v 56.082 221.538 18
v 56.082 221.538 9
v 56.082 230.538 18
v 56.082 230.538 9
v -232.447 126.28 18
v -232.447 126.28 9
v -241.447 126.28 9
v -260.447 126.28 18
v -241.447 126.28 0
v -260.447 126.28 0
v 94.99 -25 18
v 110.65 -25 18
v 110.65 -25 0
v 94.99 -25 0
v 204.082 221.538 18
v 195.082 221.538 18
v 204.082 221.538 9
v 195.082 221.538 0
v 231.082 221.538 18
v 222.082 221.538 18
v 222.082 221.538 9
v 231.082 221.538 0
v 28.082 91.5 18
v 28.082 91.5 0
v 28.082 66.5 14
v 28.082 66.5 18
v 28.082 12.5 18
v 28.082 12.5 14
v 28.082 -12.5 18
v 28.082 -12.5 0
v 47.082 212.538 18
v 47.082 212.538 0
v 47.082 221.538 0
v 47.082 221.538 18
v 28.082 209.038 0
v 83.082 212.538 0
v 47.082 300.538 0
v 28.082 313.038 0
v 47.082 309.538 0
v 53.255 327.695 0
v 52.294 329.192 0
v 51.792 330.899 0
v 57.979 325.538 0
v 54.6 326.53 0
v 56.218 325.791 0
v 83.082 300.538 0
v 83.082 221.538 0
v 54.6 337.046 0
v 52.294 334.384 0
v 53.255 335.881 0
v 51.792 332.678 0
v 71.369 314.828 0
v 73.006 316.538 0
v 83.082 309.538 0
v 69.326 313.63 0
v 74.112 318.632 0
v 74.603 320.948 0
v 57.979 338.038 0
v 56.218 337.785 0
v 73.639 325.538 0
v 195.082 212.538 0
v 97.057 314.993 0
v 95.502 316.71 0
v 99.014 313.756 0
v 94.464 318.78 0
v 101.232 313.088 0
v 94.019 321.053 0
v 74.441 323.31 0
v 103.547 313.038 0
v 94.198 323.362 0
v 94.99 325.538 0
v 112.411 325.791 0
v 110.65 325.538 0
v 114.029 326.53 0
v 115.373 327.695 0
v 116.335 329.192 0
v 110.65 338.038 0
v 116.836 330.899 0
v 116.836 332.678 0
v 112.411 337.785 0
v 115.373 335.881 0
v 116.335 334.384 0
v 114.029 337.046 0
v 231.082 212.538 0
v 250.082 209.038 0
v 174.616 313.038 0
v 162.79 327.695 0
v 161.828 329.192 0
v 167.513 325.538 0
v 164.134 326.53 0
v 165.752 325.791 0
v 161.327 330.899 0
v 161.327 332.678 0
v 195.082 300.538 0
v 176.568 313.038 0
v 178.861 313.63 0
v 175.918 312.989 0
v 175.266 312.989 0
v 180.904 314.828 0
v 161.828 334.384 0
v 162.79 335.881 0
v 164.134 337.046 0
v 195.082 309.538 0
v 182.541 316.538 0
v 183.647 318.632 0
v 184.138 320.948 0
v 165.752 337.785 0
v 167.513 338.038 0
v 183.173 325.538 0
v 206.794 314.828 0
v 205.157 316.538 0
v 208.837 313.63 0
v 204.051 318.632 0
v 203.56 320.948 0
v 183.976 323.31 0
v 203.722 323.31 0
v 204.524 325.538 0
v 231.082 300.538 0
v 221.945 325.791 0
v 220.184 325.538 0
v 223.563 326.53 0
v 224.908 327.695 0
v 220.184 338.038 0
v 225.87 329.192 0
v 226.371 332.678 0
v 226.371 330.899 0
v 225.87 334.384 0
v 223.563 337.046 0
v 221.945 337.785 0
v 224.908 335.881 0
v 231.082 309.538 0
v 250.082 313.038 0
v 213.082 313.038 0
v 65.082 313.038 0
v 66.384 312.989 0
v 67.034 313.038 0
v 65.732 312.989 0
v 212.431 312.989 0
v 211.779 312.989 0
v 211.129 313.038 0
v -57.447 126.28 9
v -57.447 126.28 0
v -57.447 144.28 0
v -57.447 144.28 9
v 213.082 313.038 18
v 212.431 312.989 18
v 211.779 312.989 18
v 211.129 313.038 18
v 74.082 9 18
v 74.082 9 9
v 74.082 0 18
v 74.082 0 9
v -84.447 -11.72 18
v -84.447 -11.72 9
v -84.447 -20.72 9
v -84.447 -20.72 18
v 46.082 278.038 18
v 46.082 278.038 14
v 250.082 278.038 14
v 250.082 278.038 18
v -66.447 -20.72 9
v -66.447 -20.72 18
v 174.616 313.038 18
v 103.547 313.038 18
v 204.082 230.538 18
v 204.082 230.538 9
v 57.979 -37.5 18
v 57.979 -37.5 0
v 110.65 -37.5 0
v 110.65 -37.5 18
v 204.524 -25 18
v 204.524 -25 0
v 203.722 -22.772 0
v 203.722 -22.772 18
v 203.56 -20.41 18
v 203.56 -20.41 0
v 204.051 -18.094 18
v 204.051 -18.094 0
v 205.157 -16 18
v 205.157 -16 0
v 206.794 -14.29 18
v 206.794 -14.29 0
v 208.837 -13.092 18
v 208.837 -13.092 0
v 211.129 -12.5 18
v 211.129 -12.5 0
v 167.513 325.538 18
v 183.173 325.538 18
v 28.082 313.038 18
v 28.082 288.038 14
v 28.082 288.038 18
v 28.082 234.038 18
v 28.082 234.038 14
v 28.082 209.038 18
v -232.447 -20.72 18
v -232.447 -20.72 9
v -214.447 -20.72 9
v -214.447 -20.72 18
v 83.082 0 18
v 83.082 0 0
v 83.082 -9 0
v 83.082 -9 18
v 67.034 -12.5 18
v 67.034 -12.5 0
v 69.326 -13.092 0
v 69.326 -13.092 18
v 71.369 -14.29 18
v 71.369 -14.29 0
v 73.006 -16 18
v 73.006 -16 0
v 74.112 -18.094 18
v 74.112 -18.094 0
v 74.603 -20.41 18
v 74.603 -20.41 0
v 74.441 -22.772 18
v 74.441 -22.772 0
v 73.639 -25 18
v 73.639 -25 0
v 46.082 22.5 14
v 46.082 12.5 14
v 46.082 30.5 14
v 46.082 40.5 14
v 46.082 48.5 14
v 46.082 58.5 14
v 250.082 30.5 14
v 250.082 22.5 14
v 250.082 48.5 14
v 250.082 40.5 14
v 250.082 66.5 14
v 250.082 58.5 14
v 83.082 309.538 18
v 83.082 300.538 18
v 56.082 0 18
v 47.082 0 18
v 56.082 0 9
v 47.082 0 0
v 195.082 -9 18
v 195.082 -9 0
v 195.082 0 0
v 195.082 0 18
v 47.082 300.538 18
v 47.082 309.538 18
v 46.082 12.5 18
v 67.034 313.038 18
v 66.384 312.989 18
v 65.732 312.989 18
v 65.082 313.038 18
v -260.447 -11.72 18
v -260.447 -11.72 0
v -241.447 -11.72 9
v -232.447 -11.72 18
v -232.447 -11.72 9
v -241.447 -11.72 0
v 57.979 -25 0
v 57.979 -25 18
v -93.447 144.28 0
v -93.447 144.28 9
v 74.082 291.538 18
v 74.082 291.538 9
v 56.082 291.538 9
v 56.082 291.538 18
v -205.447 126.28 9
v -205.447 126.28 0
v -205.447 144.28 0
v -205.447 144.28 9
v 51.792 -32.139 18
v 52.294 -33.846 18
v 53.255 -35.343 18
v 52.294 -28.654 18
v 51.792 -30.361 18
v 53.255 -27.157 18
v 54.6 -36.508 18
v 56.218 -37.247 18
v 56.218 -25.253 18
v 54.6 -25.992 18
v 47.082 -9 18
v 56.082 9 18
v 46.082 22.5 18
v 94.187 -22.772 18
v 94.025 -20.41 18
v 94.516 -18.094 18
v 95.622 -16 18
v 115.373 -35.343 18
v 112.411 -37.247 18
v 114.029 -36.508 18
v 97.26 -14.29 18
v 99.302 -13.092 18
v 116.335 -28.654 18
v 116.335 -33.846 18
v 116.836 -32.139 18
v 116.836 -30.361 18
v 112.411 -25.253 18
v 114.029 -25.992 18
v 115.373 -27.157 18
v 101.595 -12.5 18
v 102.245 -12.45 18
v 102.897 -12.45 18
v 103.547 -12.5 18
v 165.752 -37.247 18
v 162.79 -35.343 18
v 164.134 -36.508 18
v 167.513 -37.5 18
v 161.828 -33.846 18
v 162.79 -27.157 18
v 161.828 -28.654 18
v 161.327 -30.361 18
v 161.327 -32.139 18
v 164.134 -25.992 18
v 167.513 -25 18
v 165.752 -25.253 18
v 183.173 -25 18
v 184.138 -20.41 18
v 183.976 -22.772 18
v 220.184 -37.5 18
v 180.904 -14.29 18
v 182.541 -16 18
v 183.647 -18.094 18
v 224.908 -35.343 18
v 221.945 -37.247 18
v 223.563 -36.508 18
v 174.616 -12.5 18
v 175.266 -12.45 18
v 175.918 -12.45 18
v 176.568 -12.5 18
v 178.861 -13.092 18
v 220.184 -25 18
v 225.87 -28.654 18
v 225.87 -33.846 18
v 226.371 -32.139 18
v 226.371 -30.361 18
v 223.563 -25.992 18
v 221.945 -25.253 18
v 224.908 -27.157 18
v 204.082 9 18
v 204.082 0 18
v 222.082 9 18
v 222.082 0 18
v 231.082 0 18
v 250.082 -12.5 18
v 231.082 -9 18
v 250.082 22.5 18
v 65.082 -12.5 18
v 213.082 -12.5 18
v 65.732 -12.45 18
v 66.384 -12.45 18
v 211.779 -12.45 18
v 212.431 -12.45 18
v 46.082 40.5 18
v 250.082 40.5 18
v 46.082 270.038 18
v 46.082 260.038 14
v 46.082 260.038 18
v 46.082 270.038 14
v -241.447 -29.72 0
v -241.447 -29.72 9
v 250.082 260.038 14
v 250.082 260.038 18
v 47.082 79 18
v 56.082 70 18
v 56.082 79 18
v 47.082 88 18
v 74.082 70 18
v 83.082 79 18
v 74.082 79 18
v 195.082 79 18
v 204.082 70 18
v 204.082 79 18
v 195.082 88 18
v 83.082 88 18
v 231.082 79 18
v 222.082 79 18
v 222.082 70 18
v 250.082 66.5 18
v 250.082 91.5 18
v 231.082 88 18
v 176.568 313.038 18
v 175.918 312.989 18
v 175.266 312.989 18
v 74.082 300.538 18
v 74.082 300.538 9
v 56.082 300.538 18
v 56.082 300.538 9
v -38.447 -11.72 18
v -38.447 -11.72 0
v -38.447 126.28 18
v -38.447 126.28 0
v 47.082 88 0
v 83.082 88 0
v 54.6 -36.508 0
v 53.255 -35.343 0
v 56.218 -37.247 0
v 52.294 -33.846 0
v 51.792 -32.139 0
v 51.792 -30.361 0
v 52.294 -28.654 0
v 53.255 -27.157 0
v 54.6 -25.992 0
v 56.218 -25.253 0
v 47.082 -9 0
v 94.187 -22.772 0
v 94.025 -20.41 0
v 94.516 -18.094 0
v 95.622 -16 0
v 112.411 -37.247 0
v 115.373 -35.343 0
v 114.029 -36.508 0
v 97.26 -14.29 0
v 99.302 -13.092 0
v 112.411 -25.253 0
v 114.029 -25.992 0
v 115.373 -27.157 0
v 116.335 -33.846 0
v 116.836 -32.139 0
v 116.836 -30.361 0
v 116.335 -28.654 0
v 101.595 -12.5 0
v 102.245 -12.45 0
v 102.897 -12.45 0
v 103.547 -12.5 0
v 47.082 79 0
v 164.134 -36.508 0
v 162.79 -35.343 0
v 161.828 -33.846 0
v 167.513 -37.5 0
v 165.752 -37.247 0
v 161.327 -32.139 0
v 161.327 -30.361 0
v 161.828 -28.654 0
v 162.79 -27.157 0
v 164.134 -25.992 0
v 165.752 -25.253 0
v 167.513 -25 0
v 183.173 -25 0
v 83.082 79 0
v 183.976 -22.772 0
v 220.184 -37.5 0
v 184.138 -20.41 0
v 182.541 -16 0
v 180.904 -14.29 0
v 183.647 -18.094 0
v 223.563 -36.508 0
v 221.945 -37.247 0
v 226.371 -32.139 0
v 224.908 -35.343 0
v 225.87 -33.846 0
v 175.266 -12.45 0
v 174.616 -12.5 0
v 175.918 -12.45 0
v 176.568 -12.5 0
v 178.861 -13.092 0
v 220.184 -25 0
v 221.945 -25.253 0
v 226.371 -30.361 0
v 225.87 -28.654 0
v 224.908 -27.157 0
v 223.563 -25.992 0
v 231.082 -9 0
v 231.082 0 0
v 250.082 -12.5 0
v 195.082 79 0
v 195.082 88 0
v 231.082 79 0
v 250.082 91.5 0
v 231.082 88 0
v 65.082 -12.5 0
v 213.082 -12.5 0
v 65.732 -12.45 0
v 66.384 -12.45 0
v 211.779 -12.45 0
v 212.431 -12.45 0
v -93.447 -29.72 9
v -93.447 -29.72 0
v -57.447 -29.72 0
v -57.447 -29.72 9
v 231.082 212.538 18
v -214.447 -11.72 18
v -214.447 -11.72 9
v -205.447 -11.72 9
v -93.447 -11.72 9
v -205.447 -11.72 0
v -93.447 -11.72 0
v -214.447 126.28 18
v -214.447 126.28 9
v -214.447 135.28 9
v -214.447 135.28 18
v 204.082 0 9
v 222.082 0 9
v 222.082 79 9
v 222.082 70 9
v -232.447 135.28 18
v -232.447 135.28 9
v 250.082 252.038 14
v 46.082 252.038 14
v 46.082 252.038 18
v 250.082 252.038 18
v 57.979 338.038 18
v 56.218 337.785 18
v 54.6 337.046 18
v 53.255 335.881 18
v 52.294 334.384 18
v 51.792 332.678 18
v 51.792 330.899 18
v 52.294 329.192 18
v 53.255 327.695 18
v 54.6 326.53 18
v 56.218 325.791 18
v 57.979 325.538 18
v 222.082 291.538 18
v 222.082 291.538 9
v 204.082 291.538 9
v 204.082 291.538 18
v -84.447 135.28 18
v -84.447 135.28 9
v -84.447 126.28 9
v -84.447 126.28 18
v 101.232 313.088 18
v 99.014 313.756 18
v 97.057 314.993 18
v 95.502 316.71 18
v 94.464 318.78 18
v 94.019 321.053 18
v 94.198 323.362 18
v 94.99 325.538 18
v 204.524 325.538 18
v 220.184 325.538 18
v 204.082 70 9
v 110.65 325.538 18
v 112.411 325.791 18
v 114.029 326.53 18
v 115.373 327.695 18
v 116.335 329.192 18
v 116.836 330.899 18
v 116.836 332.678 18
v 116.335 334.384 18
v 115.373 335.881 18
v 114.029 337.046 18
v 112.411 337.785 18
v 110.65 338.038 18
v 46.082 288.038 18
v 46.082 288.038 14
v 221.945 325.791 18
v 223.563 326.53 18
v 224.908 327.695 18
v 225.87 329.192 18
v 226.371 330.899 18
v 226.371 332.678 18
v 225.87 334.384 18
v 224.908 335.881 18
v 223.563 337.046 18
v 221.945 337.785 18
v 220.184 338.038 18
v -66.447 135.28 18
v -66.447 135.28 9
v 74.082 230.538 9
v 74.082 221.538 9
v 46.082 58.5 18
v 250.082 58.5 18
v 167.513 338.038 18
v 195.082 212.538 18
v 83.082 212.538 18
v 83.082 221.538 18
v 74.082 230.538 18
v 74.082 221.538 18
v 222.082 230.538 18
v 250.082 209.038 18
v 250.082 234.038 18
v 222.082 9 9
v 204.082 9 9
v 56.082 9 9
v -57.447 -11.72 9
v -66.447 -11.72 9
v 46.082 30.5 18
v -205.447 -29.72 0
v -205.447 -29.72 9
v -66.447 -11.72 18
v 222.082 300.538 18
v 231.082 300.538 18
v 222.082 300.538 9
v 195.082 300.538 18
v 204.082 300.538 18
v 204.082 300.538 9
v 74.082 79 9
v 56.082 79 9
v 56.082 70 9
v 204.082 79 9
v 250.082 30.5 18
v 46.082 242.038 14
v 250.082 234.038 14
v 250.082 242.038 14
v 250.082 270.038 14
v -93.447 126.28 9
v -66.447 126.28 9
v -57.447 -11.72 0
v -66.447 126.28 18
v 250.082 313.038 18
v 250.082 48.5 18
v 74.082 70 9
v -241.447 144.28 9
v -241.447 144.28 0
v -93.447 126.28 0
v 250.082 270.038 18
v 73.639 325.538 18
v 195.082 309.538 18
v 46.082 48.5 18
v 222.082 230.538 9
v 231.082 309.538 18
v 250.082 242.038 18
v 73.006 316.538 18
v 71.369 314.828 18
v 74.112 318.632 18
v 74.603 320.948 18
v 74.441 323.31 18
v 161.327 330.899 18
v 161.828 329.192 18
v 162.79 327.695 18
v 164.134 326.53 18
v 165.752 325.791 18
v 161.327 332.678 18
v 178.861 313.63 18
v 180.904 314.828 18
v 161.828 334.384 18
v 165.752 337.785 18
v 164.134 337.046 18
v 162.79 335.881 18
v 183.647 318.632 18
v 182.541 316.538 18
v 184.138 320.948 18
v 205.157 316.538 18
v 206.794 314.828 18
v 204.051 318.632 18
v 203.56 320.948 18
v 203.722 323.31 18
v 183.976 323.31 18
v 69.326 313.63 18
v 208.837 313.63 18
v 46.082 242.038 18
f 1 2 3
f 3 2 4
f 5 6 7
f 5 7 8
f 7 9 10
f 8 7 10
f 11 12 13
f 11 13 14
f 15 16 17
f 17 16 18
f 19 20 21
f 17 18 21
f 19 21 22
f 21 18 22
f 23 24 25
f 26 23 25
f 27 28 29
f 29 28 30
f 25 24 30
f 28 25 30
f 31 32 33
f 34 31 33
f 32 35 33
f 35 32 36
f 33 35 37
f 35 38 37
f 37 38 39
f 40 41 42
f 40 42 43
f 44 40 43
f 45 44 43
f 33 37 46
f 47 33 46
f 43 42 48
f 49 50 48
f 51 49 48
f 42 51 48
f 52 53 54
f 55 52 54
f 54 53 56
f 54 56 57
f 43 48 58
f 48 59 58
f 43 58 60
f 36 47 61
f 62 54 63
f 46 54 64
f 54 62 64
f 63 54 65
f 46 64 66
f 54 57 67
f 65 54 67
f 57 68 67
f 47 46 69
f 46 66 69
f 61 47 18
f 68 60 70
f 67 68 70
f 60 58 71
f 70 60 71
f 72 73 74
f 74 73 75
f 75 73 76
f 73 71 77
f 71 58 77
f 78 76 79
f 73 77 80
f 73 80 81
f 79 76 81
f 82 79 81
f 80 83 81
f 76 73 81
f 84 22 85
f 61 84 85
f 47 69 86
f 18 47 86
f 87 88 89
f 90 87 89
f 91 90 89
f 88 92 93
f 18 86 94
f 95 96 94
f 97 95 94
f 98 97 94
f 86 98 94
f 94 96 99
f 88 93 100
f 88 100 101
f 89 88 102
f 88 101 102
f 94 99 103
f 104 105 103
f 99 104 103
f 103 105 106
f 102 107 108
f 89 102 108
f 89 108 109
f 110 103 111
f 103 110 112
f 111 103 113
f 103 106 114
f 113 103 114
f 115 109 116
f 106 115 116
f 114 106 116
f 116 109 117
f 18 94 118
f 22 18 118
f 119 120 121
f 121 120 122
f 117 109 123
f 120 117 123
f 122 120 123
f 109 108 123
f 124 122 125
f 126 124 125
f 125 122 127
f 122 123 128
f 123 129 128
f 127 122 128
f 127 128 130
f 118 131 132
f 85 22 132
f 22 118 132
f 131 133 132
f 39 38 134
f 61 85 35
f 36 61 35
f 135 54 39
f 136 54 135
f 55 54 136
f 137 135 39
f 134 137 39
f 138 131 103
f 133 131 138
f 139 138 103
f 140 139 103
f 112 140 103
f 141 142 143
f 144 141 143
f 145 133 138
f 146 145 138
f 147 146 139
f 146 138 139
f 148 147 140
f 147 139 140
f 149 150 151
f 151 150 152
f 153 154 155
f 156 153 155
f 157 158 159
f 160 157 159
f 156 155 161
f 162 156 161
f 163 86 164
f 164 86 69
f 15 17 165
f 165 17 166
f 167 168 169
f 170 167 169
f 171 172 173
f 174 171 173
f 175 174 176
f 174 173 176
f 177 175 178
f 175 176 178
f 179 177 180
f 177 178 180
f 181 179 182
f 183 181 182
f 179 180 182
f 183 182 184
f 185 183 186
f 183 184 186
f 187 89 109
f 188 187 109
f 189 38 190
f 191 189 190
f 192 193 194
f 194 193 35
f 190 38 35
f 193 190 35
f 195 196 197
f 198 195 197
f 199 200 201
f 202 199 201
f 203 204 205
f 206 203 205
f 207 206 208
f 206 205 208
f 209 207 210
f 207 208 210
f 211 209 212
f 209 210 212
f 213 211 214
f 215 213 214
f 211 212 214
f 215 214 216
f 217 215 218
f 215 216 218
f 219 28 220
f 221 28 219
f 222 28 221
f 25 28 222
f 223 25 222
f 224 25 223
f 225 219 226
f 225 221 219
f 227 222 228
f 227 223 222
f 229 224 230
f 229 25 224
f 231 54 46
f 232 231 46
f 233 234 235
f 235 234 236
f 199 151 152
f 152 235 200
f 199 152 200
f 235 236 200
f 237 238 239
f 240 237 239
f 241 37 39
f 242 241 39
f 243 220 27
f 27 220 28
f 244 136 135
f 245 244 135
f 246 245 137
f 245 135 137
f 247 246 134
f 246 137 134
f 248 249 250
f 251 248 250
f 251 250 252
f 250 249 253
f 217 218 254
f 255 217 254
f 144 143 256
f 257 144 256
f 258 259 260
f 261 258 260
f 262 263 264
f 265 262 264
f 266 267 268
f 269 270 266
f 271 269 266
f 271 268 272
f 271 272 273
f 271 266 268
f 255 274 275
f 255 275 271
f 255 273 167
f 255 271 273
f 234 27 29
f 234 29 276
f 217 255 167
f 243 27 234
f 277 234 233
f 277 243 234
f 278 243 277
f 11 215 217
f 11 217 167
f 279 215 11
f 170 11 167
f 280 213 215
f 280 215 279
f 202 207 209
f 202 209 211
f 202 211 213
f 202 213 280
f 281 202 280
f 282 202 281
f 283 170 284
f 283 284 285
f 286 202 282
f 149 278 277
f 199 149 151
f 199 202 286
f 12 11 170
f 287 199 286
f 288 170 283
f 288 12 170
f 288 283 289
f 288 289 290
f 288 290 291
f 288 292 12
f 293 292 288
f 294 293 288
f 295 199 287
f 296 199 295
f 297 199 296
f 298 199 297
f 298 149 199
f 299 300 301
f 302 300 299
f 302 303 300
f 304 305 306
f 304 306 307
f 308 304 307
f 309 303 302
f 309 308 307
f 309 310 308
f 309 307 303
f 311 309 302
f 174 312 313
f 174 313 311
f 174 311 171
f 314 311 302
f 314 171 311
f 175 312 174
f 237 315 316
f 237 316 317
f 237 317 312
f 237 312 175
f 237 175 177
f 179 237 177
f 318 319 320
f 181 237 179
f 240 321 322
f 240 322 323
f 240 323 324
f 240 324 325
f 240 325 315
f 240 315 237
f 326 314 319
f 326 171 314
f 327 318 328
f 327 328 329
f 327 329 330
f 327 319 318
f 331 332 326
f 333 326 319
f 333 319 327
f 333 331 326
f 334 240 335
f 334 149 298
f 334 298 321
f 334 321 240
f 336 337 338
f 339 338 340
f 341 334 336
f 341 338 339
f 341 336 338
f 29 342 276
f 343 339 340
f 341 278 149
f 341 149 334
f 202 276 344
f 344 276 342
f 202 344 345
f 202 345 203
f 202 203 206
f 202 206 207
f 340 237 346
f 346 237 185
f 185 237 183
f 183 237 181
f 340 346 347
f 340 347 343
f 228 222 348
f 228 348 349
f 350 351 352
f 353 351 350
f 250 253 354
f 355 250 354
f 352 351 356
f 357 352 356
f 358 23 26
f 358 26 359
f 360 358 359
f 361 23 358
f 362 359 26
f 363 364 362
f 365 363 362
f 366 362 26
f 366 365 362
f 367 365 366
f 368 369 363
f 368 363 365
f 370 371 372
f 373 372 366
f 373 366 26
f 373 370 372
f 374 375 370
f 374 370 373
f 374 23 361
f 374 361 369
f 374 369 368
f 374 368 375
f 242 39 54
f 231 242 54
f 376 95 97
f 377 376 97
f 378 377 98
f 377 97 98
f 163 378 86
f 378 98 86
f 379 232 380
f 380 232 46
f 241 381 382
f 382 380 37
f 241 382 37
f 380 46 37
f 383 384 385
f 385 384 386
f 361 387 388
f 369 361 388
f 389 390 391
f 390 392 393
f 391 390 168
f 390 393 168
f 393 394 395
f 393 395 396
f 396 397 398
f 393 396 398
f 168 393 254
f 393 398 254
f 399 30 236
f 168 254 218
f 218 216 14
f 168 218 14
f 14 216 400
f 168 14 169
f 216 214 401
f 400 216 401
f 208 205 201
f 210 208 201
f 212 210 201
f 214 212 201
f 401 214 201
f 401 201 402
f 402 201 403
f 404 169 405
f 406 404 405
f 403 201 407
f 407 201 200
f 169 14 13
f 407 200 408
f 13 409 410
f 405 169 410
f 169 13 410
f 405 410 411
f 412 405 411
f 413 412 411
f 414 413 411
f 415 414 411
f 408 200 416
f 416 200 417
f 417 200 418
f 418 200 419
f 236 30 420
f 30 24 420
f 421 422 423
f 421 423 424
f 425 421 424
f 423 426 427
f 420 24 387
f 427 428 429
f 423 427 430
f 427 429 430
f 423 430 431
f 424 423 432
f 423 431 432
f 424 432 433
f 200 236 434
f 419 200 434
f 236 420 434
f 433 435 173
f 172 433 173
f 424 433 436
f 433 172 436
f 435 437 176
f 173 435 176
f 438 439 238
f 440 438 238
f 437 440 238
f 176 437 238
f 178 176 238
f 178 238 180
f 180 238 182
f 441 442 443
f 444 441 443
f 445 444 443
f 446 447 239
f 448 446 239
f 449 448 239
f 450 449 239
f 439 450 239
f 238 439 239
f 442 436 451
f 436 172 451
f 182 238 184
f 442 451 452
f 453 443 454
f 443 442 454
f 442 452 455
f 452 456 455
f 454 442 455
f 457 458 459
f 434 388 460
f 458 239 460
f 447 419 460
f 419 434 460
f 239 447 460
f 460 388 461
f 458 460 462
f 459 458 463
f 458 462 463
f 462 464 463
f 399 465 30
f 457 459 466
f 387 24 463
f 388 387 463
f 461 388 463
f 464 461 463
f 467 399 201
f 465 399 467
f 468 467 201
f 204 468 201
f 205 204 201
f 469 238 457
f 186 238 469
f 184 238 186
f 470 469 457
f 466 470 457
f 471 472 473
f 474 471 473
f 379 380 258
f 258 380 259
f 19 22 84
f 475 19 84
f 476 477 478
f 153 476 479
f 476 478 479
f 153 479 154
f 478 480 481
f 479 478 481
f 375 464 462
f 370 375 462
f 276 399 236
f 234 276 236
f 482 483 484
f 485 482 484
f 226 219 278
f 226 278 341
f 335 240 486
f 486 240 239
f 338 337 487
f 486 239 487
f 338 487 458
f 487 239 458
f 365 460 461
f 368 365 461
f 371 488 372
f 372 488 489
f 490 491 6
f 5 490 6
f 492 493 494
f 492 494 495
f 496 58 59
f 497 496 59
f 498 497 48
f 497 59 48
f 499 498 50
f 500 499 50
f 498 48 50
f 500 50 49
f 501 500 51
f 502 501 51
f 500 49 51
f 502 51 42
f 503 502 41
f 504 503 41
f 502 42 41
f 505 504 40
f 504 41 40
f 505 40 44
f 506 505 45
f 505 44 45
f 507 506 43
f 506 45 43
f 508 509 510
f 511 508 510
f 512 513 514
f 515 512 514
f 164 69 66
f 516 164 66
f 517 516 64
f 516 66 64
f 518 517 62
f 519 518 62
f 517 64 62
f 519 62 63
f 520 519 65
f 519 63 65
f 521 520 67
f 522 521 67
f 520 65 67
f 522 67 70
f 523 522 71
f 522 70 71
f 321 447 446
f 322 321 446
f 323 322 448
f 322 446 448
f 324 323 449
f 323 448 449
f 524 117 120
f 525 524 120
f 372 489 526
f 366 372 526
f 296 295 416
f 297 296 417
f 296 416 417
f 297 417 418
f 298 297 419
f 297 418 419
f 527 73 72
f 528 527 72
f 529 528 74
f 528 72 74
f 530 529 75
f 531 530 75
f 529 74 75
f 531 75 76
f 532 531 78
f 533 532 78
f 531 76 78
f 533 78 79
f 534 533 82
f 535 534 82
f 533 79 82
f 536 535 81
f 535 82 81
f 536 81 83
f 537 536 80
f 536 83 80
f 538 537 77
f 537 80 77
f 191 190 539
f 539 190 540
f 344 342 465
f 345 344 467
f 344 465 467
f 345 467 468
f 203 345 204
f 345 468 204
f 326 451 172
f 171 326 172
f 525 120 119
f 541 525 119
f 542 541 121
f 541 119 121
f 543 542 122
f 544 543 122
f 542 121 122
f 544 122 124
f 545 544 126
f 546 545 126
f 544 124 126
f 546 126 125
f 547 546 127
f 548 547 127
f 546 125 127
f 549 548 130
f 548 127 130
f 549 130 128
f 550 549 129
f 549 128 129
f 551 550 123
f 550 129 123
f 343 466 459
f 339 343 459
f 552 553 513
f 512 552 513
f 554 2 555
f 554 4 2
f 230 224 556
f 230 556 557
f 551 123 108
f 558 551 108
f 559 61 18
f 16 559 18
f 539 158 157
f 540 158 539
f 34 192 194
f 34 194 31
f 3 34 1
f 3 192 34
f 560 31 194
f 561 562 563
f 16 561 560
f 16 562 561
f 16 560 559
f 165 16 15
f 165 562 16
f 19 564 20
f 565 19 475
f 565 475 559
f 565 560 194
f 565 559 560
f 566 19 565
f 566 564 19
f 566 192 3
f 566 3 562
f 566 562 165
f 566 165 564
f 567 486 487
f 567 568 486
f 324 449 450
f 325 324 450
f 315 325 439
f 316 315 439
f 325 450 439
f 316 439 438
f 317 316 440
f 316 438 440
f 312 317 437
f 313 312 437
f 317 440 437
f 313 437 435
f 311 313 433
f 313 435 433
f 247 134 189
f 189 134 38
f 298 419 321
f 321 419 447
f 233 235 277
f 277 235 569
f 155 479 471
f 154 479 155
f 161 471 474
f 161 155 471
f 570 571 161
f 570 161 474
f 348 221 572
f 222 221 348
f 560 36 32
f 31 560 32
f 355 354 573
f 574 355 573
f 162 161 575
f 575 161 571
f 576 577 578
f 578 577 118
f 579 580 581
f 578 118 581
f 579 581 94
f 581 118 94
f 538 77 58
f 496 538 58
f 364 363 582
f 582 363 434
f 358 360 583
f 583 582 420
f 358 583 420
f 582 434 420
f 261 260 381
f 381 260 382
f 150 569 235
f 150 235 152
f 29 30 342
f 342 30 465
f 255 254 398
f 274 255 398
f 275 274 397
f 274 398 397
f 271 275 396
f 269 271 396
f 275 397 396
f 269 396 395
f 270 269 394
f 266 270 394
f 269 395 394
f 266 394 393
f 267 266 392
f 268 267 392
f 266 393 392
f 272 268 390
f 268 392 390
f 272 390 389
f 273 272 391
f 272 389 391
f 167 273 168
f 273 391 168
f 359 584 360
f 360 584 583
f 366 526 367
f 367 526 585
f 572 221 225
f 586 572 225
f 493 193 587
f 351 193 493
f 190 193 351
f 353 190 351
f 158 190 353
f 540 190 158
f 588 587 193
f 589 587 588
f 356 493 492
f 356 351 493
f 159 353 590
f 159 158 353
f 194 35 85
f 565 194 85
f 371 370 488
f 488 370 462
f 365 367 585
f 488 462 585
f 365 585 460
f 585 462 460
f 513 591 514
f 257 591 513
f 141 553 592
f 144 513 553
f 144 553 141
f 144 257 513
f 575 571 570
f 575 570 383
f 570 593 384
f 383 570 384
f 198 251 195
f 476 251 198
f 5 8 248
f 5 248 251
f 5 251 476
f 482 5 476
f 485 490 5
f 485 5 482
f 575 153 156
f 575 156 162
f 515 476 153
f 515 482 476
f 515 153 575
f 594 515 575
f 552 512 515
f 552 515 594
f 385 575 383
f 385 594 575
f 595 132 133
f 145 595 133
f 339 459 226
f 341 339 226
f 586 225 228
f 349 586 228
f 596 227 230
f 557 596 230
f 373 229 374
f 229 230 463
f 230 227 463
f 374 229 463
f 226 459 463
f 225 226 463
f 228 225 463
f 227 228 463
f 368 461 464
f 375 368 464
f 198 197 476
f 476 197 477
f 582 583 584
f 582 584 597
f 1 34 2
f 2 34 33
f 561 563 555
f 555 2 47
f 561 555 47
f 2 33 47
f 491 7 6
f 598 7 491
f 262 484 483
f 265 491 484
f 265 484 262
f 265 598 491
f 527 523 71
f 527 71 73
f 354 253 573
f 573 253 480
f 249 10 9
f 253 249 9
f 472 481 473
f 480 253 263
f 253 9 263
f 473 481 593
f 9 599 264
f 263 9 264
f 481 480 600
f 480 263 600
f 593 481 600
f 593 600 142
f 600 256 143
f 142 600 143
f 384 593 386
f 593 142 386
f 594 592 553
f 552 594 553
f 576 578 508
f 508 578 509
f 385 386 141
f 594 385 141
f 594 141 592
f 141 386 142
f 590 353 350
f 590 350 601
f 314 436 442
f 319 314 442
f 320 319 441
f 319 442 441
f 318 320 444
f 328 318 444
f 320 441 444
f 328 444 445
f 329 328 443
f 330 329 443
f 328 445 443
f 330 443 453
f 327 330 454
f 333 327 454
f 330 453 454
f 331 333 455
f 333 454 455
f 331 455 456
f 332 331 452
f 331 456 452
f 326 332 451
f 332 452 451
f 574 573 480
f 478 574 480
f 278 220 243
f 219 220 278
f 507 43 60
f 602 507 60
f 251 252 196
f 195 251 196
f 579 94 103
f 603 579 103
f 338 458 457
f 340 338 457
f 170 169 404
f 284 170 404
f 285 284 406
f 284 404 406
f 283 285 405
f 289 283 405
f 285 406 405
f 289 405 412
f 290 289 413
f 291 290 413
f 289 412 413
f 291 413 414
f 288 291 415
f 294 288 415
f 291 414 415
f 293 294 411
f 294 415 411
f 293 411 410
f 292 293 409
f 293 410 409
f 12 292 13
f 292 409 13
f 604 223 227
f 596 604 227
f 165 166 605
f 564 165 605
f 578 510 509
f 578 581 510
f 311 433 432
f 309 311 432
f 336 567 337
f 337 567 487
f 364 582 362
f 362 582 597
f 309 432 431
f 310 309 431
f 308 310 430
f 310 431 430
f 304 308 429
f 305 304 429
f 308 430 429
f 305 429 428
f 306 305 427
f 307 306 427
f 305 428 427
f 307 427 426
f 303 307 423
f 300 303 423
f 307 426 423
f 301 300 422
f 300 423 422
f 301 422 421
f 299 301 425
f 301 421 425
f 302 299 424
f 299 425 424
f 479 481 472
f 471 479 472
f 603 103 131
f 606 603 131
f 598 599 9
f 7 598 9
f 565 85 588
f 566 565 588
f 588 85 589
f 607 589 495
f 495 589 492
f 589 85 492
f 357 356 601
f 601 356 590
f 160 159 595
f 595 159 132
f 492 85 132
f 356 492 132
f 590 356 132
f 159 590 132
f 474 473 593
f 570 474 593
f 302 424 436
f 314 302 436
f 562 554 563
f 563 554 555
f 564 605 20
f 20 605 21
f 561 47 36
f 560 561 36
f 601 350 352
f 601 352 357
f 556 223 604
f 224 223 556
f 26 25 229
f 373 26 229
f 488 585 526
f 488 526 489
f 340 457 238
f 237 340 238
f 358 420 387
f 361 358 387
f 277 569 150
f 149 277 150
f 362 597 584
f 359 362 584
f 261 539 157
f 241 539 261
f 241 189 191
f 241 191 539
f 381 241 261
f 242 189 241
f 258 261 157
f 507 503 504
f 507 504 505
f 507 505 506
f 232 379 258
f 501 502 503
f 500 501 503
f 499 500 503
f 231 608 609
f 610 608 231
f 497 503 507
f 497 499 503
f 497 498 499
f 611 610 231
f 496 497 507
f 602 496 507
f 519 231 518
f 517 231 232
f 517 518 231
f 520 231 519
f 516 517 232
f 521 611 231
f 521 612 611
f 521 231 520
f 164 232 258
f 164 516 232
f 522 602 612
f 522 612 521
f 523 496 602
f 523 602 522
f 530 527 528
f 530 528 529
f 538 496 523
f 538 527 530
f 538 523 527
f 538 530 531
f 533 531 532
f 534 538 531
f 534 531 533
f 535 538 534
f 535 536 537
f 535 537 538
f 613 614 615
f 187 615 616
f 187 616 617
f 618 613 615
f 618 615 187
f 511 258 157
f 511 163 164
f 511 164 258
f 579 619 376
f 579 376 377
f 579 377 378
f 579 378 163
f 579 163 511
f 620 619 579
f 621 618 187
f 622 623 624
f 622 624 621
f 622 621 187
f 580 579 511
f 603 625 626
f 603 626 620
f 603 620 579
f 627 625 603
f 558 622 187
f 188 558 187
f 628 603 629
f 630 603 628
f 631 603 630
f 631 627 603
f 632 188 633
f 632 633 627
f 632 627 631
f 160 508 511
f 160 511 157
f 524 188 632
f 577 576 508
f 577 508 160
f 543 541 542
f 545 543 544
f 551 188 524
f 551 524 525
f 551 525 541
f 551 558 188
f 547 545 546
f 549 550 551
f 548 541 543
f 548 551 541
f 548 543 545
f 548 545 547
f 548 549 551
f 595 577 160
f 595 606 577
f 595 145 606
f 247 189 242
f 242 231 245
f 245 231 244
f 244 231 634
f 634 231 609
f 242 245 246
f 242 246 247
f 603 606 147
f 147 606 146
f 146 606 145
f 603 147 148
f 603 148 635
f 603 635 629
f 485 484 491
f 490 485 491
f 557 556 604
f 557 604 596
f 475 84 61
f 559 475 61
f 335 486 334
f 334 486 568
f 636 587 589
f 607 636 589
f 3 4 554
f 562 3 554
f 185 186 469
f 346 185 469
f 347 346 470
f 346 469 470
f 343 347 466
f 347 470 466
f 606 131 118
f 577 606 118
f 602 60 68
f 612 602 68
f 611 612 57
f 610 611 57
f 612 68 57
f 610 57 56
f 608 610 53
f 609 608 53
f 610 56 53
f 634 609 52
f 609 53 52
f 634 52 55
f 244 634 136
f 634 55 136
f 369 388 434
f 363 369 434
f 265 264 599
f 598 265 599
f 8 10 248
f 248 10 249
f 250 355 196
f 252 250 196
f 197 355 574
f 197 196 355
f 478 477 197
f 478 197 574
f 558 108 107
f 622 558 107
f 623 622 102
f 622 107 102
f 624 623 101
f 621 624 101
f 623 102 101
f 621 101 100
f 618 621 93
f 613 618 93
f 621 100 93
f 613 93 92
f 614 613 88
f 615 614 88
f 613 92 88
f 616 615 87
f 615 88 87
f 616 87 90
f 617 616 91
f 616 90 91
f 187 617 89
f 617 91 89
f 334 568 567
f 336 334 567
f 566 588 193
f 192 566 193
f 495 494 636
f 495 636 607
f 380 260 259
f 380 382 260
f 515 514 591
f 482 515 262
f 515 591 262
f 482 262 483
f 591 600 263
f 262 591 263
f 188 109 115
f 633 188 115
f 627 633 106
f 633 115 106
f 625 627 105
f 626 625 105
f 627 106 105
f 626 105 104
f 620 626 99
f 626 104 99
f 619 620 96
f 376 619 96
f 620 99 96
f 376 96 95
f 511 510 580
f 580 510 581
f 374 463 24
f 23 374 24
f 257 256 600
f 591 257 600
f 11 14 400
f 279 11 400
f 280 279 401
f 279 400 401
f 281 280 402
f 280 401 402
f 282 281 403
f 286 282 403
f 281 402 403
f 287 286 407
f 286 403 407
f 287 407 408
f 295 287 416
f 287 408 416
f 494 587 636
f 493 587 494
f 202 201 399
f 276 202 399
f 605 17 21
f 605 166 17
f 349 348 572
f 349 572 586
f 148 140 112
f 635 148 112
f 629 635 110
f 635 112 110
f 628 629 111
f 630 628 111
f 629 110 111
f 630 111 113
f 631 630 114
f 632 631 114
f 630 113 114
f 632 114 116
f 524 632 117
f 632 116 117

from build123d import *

# Parameters (mm, degrees)
F0_W     = 204
F0_H     = 10
F2_DEPTH = 18
F3_DEPTH = 9
F4_DEPTH = 14


with BuildPart() as f2:
    # F0 (on Top) + F1 (on Top) → F2 (new body)
    with BuildSketch(Plane.XY):
        with BuildLine():
            Line((46.081543, 12.5), (28.081543, 12.5))
            Line((28.081543, 12.5), (28.081543, -12.5))
            Line((28.081543, -12.5), (65.081543, -12.5))
            ThreePointArc((65.081543, -12.5), (66.057675, -12.444206), (67.033806, -12.5))
            ThreePointArc((67.033806, -12.5), (73.631966, -17.008573), (73.638971, -25))
            Line((73.638971, -25), (57.978767, -25))
            ThreePointArc((57.978767, -25), (51.728767, -31.25), (57.978767, -37.5))
            Line((57.978767, -37.5), (110.649899, -37.5))
            ThreePointArc((110.649899, -37.5), (116.899899, -31.25), (110.649899, -25))
            Line((110.649899, -25), (94.989694, -25))
            ThreePointArc((94.989694, -25), (94.996699, -17.008573), (101.594859, -12.5))
            ThreePointArc((101.594859, -12.5), (102.570991, -12.444206), (103.547122, -12.5))
            Line((103.547122, -12.5), (119.848753, -12.5))
            Line((119.848753, -12.5), (158.314333, -12.5))
            Line((158.314333, -12.5), (174.615964, -12.5))
            ThreePointArc((174.615964, -12.5), (175.592095, -12.444206), (176.568227, -12.5))
            ThreePointArc((176.568227, -12.5), (183.166387, -17.008573), (183.173392, -25))
            Line((183.173392, -25), (167.513187, -25))
            ThreePointArc((167.513187, -25), (161.263187, -31.25), (167.513187, -37.5))
            Line((167.513187, -37.5), (220.184319, -37.5))
            ThreePointArc((220.184319, -37.5), (226.434319, -31.25), (220.184319, -25))
            Line((220.184319, -25), (204.524115, -25))
            ThreePointArc((204.524115, -25), (204.53112, -17.008573), (211.12928, -12.5))
            ThreePointArc((211.12928, -12.5), (212.105411, -12.444206), (213.081543, -12.5))
            Line((213.081543, -12.5), (250.081543, -12.5))
            Line((250.081543, -12.5), (250.081543, 12.5))
            Line((250.081543, 12.5), (46.081543, 12.5))
        make_face()
        Polygon((83.081543, -9), (65.081543, -9), (47.081543, -9), (47.081543, 0), (56.081543, 0), (56.081543, 9), (65.081543, 9), (74.081543, 9), (74.081543, 0), (83.081543, 0), align=None, mode=Mode.SUBTRACT)
        Polygon((231.081543, -9), (213.081543, -9), (195.081543, -9), (195.081543, 0), (204.081543, 0), (204.081543, 9), (213.081543, 9), (222.081543, 9), (222.081543, 0), (231.081543, 0), align=None, mode=Mode.SUBTRACT)
        Polygon((176.081543, 91.5), (102.081543, 91.5), (28.081543, 91.5), (28.081543, 66.5), (250.081543, 66.5), (250.081543, 91.5), align=None)
        Polygon((47.081543, 88), (65.081543, 88), (83.081543, 88), (83.081543, 79), (74.081543, 79), (74.081543, 70), (65.081543, 70), (56.081543, 70), (56.081543, 79), (47.081543, 79), align=None, mode=Mode.SUBTRACT)
        Polygon((195.081543, 88), (213.081543, 88), (231.081543, 88), (231.081543, 79), (222.081543, 79), (222.081543, 70), (213.081543, 70), (204.081543, 70), (204.081543, 79), (195.081543, 79), align=None, mode=Mode.SUBTRACT)
        with Locations((148.081543, 53.5)):
            Rectangle(F0_W, F0_H)
        with Locations((148.081543, 35.5)):
            Rectangle(F0_W, F0_H)
        with Locations((148.081543, 17.5)):
            Rectangle(F0_W, F0_H)
        Polygon((250.081543, 234.038093), (28.081543, 234.038093), (28.081543, 209.038093), (102.081543, 209.038093), (176.081543, 209.038093), (250.081543, 209.038093), align=None)
        Polygon((83.081543, 221.538093), (83.081543, 212.538093), (65.081543, 212.538093), (47.081543, 212.538093), (47.081543, 221.538093), (56.081543, 221.538093), (56.081543, 230.538093), (65.081543, 230.538093), (74.081543, 230.538093), (74.081543, 221.538093), align=None, mode=Mode.SUBTRACT)
        Polygon((222.081543, 221.538093), (231.081543, 221.538093), (231.081543, 212.538093), (213.081543, 212.538093), (195.081543, 212.538093), (195.081543, 221.538093), (204.081543, 221.538093), (204.081543, 230.538093), (213.081543, 230.538093), (222.081543, 230.538093), align=None, mode=Mode.SUBTRACT)
        with Locations((148.081543, 247.038093)):
            Rectangle(F0_W, F0_H)
        with Locations((148.081543, 265.038093)):
            Rectangle(F0_W, F0_H)
        with Locations((148.081543, 283.038093)):
            Rectangle(F0_W, F0_H)
        with BuildLine():
            ThreePointArc((183.173392, 325.538093), (183.166387, 317.546666), (176.568227, 313.038093))
            ThreePointArc((176.568227, 313.038093), (175.592095, 312.982299), (174.615964, 313.038093))
            Line((174.615964, 313.038093), (158.314333, 313.038093))
            Line((158.314333, 313.038093), (119.848753, 313.038093))
            Line((119.848753, 313.038093), (103.547122, 313.038093))
            ThreePointArc((103.547122, 313.038093), (95.502076, 316.709684), (94.989694, 325.538093))
            Line((94.989694, 325.538093), (110.649899, 325.538093))
            ThreePointArc((110.649899, 325.538093), (116.899899, 331.788093), (110.649899, 338.038093))
            Line((110.649899, 338.038093), (57.978767, 338.038093))
            ThreePointArc((57.978767, 338.038093), (51.728767, 331.788093), (57.978767, 325.538093))
            Line((57.978767, 325.538093), (73.638971, 325.538093))
            ThreePointArc((73.638971, 325.538093), (73.631966, 317.546666), (67.033806, 313.038093))
            ThreePointArc((67.033806, 313.038093), (66.057675, 312.982299), (65.081543, 313.038093))
            Line((65.081543, 313.038093), (28.081543, 313.038093))
            Line((28.081543, 313.038093), (28.081543, 288.038093))
            Line((28.081543, 288.038093), (46.081543, 288.038093))
            Line((46.081543, 288.038093), (250.081543, 288.038093))
            Line((250.081543, 288.038093), (250.081543, 313.038093))
            Line((250.081543, 313.038093), (213.081543, 313.038093))
            ThreePointArc((213.081543, 313.038093), (212.105411, 312.982299), (211.12928, 313.038093))
            ThreePointArc((211.12928, 313.038093), (204.53112, 317.546666), (204.524115, 325.538093))
            Line((204.524115, 325.538093), (220.184319, 325.538093))
            ThreePointArc((220.184319, 325.538093), (226.434319, 331.788093), (220.184319, 338.038093))
            Line((220.184319, 338.038093), (167.513187, 338.038093))
            ThreePointArc((167.513187, 338.038093), (161.263187, 331.788093), (167.513187, 325.538093))
            Line((167.513187, 325.538093), (183.173392, 325.538093))
        make_face()
        Polygon((74.081543, 291.538093), (65.081543, 291.538093), (56.081543, 291.538093), (56.081543, 300.538093), (47.081543, 300.538093), (47.081543, 309.538093), (65.081543, 309.538093), (83.081543, 309.538093), (83.081543, 300.538093), (74.081543, 300.538093), align=None, mode=Mode.SUBTRACT)
        Polygon((222.081543, 291.538093), (213.081543, 291.538093), (204.081543, 291.538093), (204.081543, 300.538093), (195.081543, 300.538093), (195.081543, 309.538093), (213.081543, 309.538093), (231.081543, 309.538093), (231.081543, 300.538093), (222.081543, 300.538093), align=None, mode=Mode.SUBTRACT)
    with BuildSketch(Plane.XY):
        Polygon((-241.447025, 126.27996), (-260.447025, 126.27996), (-260.447025, -11.72004), (-241.447025, -11.72004), (-232.447025, -11.72004), (-214.447025, -11.72004), (-205.447025, -11.72004), (-93.447025, -11.72004), (-84.447025, -11.72004), (-66.447025, -11.72004), (-57.447025, -11.72004), (-38.447025, -11.72004), (-38.447025, 126.27996), (-57.447025, 126.27996), (-66.447025, 126.27996), (-75.447025, 126.27996), (-84.447025, 126.27996), (-93.447025, 126.27996), (-112.447025, 126.27996), (-186.447025, 126.27996), (-205.447025, 126.27996), (-214.447025, 126.27996), (-232.447025, 126.27996), align=None)
        Polygon((-84.447025, 135.27996), (-84.447025, 126.27996), (-75.447025, 126.27996), (-66.447025, 126.27996), (-66.447025, 135.27996), (-75.447025, 135.27996), align=None)
        Polygon((-66.447025, -11.72004), (-84.447025, -11.72004), (-84.447025, -20.72004), (-75.447025, -20.72004), (-66.447025, -20.72004), align=None)
        Polygon((-214.447025, -11.72004), (-232.447025, -11.72004), (-232.447025, -20.72004), (-223.447025, -20.72004), (-214.447025, -20.72004), align=None)
        Polygon((-232.447025, 135.27996), (-232.447025, 126.27996), (-214.447025, 126.27996), (-214.447025, 135.27996), (-223.447025, 135.27996), align=None)
    extrude(amount=F2_DEPTH)

    # F0 (on Top) + F1 (on Top) → F3 (join)
    with BuildSketch(Plane.XY):
        Polygon((56.081543, 291.538093), (65.081543, 291.538093), (74.081543, 291.538093), (74.081543, 300.538093), (56.081543, 300.538093), align=None)
        Polygon((56.081543, 221.538093), (74.081543, 221.538093), (74.081543, 230.538093), (65.081543, 230.538093), (56.081543, 230.538093), align=None)
        Polygon((204.081543, 221.538093), (222.081543, 221.538093), (222.081543, 230.538093), (213.081543, 230.538093), (204.081543, 230.538093), align=None)
        Polygon((204.081543, 291.538093), (213.081543, 291.538093), (222.081543, 291.538093), (222.081543, 300.538093), (204.081543, 300.538093), align=None)
        Polygon((222.081543, 79), (204.081543, 79), (204.081543, 70), (213.081543, 70), (222.081543, 70), align=None)
        Polygon((74.081543, 70), (74.081543, 79), (56.081543, 79), (56.081543, 70), (65.081543, 70), align=None)
        Polygon((56.081543, 9), (56.081543, 0), (74.081543, 0), (74.081543, 9), (65.081543, 9), align=None)
        Polygon((204.081543, 0), (222.081543, 0), (222.081543, 9), (213.081543, 9), (204.081543, 9), align=None)
    with BuildSketch(Plane.XY):
        Polygon((-93.447025, 144.27996), (-93.447025, 126.27996), (-84.447025, 126.27996), (-84.447025, 135.27996), (-75.447025, 135.27996), (-66.447025, 135.27996), (-66.447025, 126.27996), (-57.447025, 126.27996), (-57.447025, 144.27996), (-75.447025, 144.27996), align=None)
        Polygon((-241.447025, 144.27996), (-241.447025, 126.27996), (-232.447025, 126.27996), (-232.447025, 135.27996), (-223.447025, 135.27996), (-214.447025, 135.27996), (-214.447025, 126.27996), (-205.447025, 126.27996), (-205.447025, 144.27996), (-223.447025, 144.27996), align=None)
        Polygon((-232.447025, -11.72004), (-241.447025, -11.72004), (-241.447025, -29.72004), (-223.447025, -29.72004), (-205.447025, -29.72004), (-205.447025, -11.72004), (-214.447025, -11.72004), (-214.447025, -20.72004), (-223.447025, -20.72004), (-232.447025, -20.72004), align=None)
        Polygon((-84.447025, -11.72004), (-93.447025, -11.72004), (-93.447025, -29.72004), (-75.447025, -29.72004), (-57.447025, -29.72004), (-57.447025, -11.72004), (-66.447025, -11.72004), (-66.447025, -20.72004), (-75.447025, -20.72004), (-84.447025, -20.72004), align=None)
    extrude(amount=F3_DEPTH)

    # F0 (on Top) → F4 (join)
    with BuildSketch(Plane.XY):
        Polygon((46.081543, 252.038093), (28.081543, 252.038093), (28.081543, 234.038093), (250.081543, 234.038093), (250.081543, 242.038093), (46.081543, 242.038093), align=None)
        Polygon((250.081543, 252.038093), (250.081543, 260.038093), (46.081543, 260.038093), (46.081543, 270.038093), (28.081543, 270.038093), (28.081543, 252.038093), (46.081543, 252.038093), align=None)
        Polygon((250.081543, 270.038093), (250.081543, 278.038093), (46.081543, 278.038093), (46.081543, 288.038093), (28.081543, 288.038093), (28.081543, 270.038093), (46.081543, 270.038093), align=None)
        Polygon((250.081543, 66.5), (28.081543, 66.5), (28.081543, 48.5), (46.081543, 48.5), (46.081543, 58.5), (250.081543, 58.5), align=None)
        Polygon((46.081543, 48.5), (28.081543, 48.5), (28.081543, 30.5), (46.081543, 30.5), (46.081543, 40.5), (250.081543, 40.5), (250.081543, 48.5), align=None)
        Polygon((46.081543, 30.5), (28.081543, 30.5), (28.081543, 12.5), (46.081543, 12.5), (46.081543, 22.5), (250.081543, 22.5), (250.081543, 30.5), align=None)
    extrude(amount=F4_DEPTH)


solid = f2.part
